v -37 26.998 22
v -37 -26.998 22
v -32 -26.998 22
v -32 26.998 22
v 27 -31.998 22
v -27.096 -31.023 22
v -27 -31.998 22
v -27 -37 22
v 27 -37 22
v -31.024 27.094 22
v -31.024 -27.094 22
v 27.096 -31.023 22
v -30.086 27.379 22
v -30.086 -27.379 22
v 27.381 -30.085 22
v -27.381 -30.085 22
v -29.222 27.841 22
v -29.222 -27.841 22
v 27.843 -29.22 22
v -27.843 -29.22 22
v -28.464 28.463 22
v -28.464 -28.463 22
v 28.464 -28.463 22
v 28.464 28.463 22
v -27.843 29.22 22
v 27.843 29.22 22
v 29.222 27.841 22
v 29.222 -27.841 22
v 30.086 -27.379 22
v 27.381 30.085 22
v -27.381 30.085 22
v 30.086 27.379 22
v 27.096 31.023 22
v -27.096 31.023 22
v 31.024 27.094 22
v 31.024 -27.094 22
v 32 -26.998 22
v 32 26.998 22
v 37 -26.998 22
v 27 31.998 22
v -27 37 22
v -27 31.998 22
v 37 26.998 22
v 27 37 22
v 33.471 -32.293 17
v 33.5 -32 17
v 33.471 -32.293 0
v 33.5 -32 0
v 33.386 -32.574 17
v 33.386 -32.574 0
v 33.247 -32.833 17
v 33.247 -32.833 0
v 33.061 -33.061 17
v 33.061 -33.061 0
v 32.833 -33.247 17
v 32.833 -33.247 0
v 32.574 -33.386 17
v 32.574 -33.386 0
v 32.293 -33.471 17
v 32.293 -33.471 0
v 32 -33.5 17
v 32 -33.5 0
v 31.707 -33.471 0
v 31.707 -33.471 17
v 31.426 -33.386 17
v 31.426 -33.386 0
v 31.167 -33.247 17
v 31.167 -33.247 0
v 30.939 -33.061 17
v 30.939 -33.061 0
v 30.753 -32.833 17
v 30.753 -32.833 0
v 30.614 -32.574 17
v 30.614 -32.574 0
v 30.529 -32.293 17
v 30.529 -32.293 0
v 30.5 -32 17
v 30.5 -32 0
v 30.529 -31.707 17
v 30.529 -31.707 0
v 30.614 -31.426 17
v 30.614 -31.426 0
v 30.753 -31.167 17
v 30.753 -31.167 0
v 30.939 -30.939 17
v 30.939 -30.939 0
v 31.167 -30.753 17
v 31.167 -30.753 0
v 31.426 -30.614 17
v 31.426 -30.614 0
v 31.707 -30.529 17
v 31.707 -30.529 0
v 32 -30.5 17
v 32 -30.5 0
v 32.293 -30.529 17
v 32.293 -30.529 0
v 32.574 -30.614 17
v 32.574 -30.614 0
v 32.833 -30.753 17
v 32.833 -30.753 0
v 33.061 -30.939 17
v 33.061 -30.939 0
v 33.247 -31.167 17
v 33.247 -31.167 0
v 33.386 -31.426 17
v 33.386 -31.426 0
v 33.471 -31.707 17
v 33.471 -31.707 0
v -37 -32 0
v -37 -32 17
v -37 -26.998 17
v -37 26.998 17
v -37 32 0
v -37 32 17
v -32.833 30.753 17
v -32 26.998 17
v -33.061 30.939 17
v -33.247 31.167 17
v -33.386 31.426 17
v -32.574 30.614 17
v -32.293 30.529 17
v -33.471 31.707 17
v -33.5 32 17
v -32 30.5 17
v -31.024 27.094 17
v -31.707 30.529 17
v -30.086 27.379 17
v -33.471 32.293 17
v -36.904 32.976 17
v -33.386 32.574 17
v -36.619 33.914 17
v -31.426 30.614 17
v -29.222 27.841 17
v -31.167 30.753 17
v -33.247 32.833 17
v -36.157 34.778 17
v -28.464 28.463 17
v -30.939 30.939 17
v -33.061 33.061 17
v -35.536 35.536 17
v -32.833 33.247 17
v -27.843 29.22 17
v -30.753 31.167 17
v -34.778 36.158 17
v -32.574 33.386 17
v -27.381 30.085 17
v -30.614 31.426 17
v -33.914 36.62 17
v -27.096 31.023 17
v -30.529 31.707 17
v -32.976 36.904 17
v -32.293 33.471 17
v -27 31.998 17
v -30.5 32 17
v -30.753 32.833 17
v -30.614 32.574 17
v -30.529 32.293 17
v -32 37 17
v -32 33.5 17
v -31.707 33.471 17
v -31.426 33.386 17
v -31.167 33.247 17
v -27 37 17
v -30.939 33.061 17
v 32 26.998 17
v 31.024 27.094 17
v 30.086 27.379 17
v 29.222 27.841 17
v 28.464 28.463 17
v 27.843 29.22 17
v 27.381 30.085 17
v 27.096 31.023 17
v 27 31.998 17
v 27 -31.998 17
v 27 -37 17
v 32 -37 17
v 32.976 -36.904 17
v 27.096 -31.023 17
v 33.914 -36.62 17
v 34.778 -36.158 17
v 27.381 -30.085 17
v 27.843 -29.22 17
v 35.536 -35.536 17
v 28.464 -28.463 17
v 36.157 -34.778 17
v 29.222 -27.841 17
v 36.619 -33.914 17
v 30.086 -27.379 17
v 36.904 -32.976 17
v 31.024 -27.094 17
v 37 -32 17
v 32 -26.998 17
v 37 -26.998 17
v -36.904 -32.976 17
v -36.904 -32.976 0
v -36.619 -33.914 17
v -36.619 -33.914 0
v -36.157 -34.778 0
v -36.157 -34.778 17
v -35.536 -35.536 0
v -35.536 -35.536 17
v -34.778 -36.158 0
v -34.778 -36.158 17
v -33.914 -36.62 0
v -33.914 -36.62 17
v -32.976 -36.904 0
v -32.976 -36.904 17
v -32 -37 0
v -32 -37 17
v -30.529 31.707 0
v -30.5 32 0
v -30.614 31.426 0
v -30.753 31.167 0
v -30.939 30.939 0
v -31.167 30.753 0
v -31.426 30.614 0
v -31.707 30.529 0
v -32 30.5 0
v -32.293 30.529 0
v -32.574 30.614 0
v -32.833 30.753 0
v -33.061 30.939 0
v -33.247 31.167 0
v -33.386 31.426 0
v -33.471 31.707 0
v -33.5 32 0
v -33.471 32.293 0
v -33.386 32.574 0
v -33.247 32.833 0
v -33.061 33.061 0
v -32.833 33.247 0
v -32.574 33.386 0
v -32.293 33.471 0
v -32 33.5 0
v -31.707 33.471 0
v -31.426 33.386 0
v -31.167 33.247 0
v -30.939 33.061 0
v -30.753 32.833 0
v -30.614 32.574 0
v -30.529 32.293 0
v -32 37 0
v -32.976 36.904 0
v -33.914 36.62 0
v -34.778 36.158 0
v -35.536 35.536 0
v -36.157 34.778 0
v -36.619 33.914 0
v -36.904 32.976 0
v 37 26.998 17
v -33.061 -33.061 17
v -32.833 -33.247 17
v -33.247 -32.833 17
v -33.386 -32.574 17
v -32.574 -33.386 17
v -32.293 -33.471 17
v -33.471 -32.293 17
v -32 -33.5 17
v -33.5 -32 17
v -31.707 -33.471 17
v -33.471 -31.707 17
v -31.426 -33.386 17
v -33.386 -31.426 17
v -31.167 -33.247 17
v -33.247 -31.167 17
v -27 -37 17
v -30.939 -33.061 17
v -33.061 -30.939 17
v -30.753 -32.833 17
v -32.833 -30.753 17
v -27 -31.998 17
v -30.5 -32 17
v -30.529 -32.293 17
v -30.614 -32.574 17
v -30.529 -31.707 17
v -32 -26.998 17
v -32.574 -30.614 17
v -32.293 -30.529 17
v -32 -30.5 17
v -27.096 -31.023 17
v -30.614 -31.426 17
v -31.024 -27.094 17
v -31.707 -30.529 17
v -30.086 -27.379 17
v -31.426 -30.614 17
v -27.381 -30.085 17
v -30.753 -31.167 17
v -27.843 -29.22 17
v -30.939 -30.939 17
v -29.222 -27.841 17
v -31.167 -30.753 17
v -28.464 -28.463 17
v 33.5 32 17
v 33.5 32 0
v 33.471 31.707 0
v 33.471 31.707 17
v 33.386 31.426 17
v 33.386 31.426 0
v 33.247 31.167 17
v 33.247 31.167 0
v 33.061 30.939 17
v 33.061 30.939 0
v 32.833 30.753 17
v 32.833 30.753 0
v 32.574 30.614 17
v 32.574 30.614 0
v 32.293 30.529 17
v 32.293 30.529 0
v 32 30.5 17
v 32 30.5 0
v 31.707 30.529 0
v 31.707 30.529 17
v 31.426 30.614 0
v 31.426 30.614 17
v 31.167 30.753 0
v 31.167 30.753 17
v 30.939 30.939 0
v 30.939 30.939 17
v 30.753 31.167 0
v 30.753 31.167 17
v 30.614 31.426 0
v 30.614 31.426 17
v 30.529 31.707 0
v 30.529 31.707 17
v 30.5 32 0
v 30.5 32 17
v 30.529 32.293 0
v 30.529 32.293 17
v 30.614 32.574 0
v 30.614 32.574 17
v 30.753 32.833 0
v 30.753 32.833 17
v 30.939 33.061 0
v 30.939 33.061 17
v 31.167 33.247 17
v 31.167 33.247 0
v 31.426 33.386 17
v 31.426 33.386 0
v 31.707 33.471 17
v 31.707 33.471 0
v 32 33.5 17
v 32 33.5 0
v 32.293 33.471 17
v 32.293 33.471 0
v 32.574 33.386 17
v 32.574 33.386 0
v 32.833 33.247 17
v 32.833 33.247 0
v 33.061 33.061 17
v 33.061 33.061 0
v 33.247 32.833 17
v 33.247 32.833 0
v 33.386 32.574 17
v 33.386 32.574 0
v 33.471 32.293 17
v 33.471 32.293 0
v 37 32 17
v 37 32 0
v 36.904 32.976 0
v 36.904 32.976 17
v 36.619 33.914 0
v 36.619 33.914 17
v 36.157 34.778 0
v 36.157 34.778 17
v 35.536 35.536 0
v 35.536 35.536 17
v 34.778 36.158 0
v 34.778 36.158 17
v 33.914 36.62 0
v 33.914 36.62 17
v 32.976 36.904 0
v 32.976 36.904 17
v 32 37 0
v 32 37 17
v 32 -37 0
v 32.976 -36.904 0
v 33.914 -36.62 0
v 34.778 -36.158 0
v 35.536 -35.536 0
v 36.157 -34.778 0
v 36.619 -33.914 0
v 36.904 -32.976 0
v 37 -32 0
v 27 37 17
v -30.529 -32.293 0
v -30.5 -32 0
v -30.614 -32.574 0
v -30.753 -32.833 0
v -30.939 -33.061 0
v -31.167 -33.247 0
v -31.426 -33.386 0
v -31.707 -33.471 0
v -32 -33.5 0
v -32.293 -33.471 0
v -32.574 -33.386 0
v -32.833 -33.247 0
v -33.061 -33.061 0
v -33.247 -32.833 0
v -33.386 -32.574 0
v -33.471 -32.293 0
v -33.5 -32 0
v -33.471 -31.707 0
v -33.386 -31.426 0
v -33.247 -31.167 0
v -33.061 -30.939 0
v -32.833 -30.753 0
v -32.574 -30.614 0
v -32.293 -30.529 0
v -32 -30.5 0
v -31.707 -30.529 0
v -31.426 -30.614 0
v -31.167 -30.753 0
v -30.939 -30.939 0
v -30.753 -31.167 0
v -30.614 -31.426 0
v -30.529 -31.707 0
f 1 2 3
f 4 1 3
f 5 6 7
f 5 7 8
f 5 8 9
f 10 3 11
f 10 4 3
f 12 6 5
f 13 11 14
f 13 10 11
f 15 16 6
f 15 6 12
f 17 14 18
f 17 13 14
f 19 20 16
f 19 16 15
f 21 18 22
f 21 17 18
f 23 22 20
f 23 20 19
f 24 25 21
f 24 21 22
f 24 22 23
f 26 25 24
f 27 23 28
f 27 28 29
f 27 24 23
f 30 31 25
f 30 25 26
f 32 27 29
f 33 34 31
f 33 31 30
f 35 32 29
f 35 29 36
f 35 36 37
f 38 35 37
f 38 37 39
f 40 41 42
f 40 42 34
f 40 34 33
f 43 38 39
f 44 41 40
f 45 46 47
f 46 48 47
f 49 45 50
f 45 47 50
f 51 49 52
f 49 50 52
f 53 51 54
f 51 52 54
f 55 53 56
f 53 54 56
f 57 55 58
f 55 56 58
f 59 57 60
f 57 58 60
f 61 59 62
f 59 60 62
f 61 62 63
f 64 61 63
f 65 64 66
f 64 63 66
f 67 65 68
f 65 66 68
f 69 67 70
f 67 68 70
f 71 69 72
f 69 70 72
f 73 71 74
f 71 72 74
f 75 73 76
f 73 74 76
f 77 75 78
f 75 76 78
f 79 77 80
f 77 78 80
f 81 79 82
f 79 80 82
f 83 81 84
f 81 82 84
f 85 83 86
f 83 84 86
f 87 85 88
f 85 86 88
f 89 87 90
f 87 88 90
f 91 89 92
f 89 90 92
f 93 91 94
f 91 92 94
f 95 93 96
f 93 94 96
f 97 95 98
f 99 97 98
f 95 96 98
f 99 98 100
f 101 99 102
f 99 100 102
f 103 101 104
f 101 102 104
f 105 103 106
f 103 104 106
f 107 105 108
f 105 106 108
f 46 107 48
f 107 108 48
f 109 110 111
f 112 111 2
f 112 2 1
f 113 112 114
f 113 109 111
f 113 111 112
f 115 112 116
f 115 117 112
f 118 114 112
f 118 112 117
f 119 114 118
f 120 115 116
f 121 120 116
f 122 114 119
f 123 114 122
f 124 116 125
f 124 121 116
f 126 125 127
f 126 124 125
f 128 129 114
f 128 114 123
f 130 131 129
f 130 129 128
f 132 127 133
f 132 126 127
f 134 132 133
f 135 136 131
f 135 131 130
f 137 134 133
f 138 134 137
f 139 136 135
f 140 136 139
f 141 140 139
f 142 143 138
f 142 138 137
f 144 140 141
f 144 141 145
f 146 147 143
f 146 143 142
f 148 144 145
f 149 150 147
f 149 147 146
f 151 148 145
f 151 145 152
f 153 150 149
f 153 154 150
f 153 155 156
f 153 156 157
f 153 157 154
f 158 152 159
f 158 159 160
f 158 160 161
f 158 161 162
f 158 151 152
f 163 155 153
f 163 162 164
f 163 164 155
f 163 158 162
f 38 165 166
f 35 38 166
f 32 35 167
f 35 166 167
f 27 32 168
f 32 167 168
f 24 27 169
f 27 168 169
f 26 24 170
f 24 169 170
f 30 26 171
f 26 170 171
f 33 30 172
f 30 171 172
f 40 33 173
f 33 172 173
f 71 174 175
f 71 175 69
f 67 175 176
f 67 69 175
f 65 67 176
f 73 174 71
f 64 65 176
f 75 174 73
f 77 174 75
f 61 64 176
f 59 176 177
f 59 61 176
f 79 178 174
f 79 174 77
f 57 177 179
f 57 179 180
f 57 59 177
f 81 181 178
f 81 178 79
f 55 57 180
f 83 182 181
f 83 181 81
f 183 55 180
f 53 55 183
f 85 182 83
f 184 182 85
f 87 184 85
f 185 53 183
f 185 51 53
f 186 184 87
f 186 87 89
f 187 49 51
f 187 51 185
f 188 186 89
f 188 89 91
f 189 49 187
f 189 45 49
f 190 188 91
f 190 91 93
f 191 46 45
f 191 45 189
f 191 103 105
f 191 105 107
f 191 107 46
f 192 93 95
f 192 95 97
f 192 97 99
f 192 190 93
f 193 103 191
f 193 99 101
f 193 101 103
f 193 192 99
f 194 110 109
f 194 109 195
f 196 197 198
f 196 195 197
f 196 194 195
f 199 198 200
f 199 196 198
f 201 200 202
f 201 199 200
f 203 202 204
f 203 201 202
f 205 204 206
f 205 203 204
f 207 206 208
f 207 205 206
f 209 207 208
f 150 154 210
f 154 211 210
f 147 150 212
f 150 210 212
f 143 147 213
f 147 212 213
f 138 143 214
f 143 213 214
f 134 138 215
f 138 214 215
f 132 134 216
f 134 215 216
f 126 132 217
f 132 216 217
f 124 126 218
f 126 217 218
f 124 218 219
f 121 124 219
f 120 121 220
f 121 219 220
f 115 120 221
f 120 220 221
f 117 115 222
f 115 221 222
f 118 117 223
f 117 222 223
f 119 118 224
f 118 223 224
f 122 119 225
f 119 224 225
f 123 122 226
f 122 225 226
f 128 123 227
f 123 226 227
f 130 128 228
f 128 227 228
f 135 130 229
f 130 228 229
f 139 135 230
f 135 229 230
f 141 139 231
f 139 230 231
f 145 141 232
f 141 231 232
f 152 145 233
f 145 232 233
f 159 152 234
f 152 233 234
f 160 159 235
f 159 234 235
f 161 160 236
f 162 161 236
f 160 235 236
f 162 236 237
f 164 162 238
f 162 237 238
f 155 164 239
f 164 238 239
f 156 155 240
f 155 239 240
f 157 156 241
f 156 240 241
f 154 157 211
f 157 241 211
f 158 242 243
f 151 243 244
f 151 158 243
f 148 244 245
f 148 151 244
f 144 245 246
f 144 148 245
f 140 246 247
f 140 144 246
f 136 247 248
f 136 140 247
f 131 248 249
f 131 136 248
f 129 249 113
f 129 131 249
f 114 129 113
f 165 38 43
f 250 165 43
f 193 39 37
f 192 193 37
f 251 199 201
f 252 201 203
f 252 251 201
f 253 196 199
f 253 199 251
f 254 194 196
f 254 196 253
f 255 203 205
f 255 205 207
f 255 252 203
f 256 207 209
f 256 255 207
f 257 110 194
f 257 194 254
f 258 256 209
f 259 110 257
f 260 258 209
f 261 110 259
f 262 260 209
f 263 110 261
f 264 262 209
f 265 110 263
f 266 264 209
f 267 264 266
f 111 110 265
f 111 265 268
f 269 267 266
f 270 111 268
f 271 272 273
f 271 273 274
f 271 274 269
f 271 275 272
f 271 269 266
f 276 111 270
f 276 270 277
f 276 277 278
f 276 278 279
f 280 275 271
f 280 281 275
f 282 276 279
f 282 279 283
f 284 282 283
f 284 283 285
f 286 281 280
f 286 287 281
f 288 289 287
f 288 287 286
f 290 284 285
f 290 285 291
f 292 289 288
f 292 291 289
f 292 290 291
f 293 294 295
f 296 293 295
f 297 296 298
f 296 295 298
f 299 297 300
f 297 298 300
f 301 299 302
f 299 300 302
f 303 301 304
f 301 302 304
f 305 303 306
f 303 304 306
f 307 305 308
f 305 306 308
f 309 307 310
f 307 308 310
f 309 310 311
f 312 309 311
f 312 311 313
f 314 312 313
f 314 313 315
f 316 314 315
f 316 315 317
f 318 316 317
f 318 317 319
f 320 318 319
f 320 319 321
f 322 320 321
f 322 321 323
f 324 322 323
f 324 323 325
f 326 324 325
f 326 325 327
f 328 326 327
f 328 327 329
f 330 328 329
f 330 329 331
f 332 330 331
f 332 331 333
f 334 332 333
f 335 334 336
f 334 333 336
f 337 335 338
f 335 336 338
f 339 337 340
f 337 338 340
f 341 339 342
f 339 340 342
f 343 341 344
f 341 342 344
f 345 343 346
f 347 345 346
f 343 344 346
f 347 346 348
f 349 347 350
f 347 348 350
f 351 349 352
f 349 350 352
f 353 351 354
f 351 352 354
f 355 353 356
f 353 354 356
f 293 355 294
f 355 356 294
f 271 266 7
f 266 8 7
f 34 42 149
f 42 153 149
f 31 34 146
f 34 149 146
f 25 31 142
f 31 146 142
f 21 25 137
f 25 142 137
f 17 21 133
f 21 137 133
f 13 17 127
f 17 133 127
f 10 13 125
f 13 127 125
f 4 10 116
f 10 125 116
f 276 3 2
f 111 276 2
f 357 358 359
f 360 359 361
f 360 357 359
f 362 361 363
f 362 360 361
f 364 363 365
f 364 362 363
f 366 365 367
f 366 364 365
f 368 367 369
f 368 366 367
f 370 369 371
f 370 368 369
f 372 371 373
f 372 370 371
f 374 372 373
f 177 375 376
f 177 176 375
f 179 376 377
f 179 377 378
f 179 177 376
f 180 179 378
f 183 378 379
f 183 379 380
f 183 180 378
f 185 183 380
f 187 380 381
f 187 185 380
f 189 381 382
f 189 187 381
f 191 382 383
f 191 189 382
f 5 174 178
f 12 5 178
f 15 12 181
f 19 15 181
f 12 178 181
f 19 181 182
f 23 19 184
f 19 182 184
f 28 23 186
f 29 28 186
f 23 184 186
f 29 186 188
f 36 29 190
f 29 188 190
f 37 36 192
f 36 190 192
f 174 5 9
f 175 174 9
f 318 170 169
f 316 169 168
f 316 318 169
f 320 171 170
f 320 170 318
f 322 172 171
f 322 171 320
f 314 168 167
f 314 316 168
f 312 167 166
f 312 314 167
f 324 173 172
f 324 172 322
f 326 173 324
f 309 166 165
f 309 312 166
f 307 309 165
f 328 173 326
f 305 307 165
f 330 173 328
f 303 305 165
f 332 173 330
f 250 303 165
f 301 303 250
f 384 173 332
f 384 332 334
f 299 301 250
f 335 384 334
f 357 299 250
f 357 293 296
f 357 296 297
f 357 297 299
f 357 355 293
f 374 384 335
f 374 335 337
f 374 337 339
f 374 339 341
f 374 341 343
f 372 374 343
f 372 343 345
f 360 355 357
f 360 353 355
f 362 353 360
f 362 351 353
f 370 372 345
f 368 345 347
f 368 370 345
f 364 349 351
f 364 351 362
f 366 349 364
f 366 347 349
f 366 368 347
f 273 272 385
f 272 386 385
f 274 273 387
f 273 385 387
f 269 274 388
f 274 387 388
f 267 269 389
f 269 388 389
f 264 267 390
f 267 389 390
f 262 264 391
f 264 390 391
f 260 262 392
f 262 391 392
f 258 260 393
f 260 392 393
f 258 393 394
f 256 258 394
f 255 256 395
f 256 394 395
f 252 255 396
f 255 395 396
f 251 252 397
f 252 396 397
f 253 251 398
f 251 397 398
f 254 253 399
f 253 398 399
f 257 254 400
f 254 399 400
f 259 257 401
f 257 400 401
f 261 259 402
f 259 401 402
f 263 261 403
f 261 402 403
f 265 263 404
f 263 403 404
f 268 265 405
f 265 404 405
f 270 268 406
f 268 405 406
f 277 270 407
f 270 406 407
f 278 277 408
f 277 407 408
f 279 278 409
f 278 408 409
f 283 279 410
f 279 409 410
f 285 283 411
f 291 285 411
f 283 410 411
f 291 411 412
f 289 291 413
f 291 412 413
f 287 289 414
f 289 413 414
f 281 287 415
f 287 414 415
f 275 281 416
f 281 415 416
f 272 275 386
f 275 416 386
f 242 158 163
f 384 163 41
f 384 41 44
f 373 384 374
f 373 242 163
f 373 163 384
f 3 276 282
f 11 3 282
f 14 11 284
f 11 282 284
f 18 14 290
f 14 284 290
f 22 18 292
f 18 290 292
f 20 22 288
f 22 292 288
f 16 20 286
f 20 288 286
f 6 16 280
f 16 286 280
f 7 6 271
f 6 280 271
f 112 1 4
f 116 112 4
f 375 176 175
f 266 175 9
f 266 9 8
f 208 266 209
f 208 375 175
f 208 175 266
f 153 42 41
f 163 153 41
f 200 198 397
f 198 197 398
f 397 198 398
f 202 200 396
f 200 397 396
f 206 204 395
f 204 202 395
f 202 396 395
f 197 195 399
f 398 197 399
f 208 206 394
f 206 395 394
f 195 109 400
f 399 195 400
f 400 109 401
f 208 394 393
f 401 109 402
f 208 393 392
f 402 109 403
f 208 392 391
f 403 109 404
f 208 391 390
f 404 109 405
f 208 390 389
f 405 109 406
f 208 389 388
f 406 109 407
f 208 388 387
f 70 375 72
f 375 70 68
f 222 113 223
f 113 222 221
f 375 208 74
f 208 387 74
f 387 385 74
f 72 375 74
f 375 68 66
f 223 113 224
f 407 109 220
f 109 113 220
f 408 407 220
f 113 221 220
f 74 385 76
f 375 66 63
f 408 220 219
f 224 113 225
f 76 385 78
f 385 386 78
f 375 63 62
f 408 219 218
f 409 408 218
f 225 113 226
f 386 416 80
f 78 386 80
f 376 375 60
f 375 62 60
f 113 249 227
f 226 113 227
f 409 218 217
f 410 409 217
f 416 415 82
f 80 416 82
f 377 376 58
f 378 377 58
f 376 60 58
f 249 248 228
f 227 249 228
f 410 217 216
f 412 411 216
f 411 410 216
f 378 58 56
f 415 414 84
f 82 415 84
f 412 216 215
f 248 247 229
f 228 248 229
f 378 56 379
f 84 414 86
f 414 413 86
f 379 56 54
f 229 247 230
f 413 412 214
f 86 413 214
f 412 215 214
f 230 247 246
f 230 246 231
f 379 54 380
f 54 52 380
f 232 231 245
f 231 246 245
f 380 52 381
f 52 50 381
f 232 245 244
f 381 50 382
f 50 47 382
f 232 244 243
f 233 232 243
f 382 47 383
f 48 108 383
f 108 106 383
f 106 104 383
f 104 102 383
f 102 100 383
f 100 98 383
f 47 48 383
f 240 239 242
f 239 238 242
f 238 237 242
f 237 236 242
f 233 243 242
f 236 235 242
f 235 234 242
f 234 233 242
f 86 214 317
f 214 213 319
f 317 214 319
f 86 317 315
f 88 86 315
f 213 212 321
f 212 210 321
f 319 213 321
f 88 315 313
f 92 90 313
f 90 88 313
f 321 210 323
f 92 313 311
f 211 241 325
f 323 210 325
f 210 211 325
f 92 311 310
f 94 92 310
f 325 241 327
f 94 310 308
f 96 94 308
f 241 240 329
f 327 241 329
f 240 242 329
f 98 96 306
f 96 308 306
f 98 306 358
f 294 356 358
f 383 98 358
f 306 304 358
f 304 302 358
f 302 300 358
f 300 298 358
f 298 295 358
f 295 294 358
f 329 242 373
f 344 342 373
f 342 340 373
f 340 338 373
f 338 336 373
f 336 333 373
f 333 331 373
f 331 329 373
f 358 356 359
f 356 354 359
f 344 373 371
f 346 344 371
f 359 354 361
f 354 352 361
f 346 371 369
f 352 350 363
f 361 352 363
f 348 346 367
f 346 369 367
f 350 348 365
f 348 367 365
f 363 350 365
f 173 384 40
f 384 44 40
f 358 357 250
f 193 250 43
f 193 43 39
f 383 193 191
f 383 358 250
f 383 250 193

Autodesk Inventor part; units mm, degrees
ref_plane "YZ Plane" through (0, 0, 0) normal (1, 0, 0) x (0, 1, 0)
ref_plane "XZ Plane" through (0, 0, 0) normal (0, 1, 0) x (-1, 0, 0)
ref_plane "XY Plane" through (0, 0, 0) normal (0, 0, 1) x (1, 0, 0)
sketch "Sketch1" plane through (0, 0, 0) normal (0, 0, 1) x (1, 0, 0)
  line L0 (37.0001, -37.0002) -> (-37.0001, -37.0002)
  line L1 (-37.0001, -37.0002) -> (-37.0001, 37.0002)
  line L2 (-37.0001, 37.0002) -> (37.0001, 37.0002)
  line L3 (37.0001, 37.0002) -> (37.0001, -37.0002)
  line L4 (69.0001, -5.0002) -> (-5.0001, 69.0002) construction
  circle A0 centre (32, 32) radius 1.5
  circle A1 centre (32, -32) radius 1.5
  circle A2 centre (-32, 32) radius 1.5
  line L5 (5.0001, -69.0002) -> (-69.0001, 5.0002) construction
  circle A3 centre (-32, -32) radius 1.5
  line L6 (37.0001, -101.0002) -> (-37.0001, -26.9998) construction
  line L7 (5.0001, -69.0002) -> (-69.0001, 5.0002) construction
extrude "Extrusion1" add sketch "Sketch1" along normal blind 22
fillet "Fillet1" radius 5 4 edges at (-37.0001, 37.0002, 11) (37.0001, 37.0002, 11) (37.0001, -37.0002, 11) (-37.0001, -37.0002, 11)
sketch "Sketch2" plane through (0, 0, 0) normal (0, 0, -1) x (-1, 0, 0)
  point P0 (0, 0)
sketch "Sketch4" plane through (0, 0, 22) normal (0, 0, 1) x (1, 0, 0)
  point P0 (0, 0)
sketch "Sketch5" plane through (0, 0, 22) normal (0, 0, 1) x (1, 0, 0)
  line L0 (-37.0001, 32.0002) -> (-37.0001, -32.0002) projected
  line L1 (-26.9999, 37.0018) -> (-37.0001, 37.0018)
  line L2 (-37.0001, 37.0018) -> (-37.0001, 26.9982)
  line L3 (-37.0001, 26.9982) -> (-26.9999, 26.9982)
  line L4 (-26.9999, 26.9982) -> (-26.9999, 37.0018)
  circle A0 centre (-32, 32) radius 1.5 projected
  line L5 (-26.9999, 37.0018) -> (-37.0001, 26.9982) construction
  line L6 (-37.0001, 37.0018) -> (-26.9999, 26.9982) construction
  line L7 (37.0001, 37.0018) -> (26.9999, 37.0018)
  line L8 (26.9999, 37.0018) -> (26.9999, 26.9982)
  line L9 (26.9999, 26.9982) -> (37.0001, 26.9982)
  line L10 (37.0001, 26.9982) -> (37.0001, 37.0018)
  line L11 (37.0001, 37.0018) -> (26.9999, 26.9982) construction
  line L12 (26.9999, 37.0018) -> (37.0001, 26.9982) construction
  line L13 (-26.9999, -26.9982) -> (-37.0001, -26.9982)
  line L14 (-37.0001, -26.9982) -> (-37.0001, -37.0018)
  line L15 (-37.0001, -37.0018) -> (-26.9999, -37.0018)
  line L16 (-26.9999, -37.0018) -> (-26.9999, -26.9982)
  line L17 (-26.9999, -26.9982) -> (-37.0001, -37.0018) construction
  line L18 (-37.0001, -26.9982) -> (-26.9999, -37.0018) construction
  line L19 (37.0001, -26.9982) -> (26.9999, -37.0018) construction
  line L20 (37.0001, -37.0018) -> (37.0001, -26.9982)
  line L21 (26.9999, -37.0018) -> (37.0001, -37.0018)
  line L22 (26.9999, -26.9982) -> (26.9999, -37.0018)
  line L23 (37.0001, -26.9982) -> (26.9999, -26.9982)
  line L24 (26.9999, -26.9982) -> (37.0001, -37.0018) construction
  point P0 (0, 0)
extrude "Extrusion2" cut sketch "Sketch5" against normal blind 5 contours L2 L1 L4 L3 L0 | L13 L16 L15 L14 L0 | A0 | L10 L9 L8 L7 | L21 L22 L23 L20
fillet "Fillet2" radius 5 4 edges at (-26.9999, 26.9982, 19.5) (26.9999, 26.9982, 19.5) (-26.9999, -26.9982, 19.5) (26.9999, -26.9982, 19.5)
sketch "Sketch6" plane through (0, 0, 22) normal (0, 0, 1) x (1, 0, 0)
  line L0 (96.2626, 67.9332) -> (202.4541, 67.9332) construction
  line L1 (202.4541, 67.9332) -> (202.4541, -70.892) construction
  line L2 (202.4541, -70.892) -> (96.2626, -70.892) construction
  line L3 (96.2626, -70.892) -> (96.2626, 67.9332) construction
  point P0 (0, 0)
decal "Decal3"
properties part number "RTK-F9P-Sirius_rover"
